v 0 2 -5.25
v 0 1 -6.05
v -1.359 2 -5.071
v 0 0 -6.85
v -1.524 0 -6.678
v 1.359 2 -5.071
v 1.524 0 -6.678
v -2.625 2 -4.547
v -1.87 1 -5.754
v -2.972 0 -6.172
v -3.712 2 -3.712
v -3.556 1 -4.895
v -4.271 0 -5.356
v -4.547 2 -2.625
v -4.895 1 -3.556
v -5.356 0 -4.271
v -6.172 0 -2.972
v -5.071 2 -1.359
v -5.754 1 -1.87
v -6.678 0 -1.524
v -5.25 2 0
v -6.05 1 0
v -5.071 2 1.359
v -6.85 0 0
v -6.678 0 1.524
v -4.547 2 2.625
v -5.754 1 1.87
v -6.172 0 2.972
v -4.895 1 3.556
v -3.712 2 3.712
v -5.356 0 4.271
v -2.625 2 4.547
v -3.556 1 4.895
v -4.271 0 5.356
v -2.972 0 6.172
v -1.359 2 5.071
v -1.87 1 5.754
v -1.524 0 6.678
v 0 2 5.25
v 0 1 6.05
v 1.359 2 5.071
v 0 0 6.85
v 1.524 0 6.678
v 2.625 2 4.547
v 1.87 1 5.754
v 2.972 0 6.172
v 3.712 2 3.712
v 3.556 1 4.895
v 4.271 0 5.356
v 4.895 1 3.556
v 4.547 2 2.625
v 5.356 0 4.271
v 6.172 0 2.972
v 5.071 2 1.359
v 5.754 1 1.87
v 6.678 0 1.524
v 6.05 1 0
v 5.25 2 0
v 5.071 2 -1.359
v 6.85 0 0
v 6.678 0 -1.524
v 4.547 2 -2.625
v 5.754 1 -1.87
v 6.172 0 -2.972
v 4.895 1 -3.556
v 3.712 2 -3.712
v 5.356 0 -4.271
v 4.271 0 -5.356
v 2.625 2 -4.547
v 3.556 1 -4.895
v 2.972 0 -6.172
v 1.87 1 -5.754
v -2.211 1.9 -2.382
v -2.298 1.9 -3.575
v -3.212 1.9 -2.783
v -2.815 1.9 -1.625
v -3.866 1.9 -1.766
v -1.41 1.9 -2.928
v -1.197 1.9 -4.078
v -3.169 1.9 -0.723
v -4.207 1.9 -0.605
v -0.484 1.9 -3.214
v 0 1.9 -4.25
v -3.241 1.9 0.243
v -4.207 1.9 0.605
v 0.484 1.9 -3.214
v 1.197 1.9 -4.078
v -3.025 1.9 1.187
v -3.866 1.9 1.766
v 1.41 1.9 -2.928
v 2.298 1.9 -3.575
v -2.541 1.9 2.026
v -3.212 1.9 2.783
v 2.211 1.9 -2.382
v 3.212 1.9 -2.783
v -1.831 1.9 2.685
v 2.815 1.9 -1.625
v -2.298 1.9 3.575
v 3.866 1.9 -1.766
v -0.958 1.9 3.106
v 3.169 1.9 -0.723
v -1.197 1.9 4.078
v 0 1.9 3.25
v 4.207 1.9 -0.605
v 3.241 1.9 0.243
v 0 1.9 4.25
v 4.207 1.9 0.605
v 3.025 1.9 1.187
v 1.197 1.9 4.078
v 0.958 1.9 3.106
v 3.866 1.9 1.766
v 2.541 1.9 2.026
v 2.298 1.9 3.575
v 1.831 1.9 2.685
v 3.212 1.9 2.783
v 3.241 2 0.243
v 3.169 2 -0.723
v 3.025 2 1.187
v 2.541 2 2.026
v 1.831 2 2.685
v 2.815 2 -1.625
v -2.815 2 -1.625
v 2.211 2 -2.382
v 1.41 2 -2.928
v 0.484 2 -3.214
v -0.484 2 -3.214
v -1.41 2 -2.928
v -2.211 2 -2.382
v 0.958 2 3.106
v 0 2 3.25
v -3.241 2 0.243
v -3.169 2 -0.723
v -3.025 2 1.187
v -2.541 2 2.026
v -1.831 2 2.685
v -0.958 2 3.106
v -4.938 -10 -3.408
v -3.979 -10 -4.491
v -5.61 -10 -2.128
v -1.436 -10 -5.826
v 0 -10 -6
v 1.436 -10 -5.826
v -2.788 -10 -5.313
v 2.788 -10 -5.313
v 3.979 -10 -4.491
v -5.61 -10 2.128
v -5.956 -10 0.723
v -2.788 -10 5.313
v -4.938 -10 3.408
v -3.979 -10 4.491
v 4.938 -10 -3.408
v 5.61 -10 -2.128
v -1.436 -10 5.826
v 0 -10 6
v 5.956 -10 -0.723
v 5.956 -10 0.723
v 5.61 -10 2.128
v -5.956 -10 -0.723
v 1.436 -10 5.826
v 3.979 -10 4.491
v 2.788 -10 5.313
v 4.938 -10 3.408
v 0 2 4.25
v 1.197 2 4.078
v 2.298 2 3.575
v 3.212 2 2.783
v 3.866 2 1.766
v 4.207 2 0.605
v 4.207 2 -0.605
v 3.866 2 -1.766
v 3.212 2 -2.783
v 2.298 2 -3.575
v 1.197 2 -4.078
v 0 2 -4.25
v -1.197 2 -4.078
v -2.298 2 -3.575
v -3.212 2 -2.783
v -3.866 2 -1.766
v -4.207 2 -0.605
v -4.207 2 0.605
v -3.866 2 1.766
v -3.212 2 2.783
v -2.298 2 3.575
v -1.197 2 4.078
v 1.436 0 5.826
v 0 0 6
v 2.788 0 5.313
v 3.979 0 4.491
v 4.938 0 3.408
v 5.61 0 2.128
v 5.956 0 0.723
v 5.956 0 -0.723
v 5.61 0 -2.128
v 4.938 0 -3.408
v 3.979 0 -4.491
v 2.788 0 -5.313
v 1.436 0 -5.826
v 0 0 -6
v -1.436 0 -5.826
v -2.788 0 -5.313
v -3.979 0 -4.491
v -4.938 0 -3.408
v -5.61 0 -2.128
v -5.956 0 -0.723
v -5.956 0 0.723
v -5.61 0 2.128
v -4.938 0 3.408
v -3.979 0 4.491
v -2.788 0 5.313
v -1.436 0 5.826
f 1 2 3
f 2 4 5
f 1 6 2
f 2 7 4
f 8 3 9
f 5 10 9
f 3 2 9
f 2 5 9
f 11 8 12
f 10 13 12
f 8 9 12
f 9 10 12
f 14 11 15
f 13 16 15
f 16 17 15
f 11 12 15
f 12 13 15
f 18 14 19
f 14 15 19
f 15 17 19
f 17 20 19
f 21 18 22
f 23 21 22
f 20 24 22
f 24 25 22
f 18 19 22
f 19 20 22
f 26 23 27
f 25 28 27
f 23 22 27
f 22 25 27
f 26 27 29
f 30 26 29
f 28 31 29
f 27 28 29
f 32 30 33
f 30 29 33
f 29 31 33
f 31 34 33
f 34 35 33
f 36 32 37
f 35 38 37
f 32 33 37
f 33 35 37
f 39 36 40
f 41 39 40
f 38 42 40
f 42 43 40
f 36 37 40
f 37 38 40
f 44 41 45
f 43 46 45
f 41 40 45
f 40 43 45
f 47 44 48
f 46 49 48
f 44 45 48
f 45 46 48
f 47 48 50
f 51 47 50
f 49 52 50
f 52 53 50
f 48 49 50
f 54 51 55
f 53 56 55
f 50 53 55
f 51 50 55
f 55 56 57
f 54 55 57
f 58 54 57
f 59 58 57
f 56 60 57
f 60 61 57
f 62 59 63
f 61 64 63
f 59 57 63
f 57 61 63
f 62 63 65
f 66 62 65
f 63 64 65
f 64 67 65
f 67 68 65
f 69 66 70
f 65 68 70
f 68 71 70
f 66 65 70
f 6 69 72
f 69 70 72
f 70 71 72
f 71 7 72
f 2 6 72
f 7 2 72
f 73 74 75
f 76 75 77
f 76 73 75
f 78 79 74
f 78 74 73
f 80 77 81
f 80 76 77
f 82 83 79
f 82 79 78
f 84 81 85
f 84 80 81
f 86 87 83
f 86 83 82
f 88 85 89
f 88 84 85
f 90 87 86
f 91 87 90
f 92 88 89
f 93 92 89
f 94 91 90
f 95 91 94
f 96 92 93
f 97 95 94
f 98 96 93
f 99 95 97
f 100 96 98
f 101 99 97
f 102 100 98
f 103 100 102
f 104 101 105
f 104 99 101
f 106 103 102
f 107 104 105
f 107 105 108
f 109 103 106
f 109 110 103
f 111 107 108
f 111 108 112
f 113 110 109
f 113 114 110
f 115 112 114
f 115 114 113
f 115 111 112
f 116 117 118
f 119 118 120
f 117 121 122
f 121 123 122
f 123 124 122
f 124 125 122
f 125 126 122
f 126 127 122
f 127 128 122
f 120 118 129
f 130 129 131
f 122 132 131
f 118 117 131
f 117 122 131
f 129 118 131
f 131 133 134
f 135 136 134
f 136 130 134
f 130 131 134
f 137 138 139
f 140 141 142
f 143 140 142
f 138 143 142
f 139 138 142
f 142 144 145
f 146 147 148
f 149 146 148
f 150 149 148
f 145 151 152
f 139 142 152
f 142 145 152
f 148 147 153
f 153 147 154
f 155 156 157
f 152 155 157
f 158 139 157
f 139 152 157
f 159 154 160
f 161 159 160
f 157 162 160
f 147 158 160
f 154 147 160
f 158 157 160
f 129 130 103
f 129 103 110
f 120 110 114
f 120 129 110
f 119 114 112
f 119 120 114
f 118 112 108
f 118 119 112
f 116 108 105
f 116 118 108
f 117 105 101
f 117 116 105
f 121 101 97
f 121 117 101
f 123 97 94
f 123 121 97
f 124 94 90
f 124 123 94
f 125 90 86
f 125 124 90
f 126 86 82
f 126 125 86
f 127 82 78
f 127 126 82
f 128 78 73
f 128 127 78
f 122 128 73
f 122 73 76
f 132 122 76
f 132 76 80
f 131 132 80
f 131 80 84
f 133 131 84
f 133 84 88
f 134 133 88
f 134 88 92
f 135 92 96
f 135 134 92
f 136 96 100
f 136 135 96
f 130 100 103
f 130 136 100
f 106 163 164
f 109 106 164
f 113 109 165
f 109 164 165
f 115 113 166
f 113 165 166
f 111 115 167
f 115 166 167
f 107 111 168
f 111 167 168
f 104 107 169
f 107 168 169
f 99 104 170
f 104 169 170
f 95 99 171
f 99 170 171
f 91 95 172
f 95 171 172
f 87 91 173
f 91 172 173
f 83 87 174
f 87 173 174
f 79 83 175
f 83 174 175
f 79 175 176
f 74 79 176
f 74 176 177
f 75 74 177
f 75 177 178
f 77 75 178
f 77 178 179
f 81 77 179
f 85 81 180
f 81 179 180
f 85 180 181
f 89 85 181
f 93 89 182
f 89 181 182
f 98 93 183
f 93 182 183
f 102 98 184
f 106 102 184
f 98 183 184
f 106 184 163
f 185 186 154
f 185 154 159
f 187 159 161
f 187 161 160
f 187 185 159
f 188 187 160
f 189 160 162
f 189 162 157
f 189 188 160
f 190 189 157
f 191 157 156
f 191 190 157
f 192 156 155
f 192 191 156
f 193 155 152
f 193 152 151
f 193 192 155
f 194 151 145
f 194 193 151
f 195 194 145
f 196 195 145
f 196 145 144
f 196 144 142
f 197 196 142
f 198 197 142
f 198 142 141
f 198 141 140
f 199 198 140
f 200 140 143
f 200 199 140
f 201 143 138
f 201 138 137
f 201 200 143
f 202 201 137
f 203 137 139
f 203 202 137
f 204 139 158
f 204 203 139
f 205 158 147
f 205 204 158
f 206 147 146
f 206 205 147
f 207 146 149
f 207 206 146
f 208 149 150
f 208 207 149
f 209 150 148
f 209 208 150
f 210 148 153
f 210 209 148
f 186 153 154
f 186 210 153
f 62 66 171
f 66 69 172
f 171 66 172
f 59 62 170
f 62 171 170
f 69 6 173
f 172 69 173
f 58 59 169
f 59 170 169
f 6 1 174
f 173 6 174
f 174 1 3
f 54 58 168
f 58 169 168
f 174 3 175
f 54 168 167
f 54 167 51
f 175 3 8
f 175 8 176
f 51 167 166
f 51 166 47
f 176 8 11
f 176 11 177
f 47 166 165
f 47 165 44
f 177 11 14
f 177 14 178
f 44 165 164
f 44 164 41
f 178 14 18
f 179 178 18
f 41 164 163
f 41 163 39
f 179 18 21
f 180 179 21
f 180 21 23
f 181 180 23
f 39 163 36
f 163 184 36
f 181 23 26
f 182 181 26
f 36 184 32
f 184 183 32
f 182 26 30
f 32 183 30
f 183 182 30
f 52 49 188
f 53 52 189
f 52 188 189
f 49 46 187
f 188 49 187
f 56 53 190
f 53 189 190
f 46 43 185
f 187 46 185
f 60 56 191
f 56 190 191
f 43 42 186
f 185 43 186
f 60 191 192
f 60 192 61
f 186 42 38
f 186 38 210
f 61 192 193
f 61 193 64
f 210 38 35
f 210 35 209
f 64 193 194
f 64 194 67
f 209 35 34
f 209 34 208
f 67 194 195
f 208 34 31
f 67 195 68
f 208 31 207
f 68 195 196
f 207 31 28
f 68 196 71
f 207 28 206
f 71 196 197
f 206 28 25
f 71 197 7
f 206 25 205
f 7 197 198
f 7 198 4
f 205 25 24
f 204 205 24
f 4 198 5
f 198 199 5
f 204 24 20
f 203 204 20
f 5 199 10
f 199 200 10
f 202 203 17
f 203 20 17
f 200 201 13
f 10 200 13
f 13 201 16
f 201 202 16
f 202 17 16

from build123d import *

# Parameters (mm, degrees)
ESQUISSE1_R             = 6
BOSS_EXTRU_1_DEPTH      = 10
ESQUISSE4_R             = 4.25
ESQUISSE4_R_2           = 3.25
ENL_V_MAT_EXTRU_1_DEPTH = 0.1


with BuildPart() as part:
    # Esquisse1 → Boss.-Extru.1 (new body)
    with BuildSketch(Plane(origin=(0, 0, 0), x_dir=(1, 0, 0), z_dir=(0, 1, 0))):
        with Locations(Location((0, 0, 0), (0, 0, 270))):
            Circle(ESQUISSE1_R)
    extrude(amount=-BOSS_EXTRU_1_DEPTH)

    # Esquisse3 → Révolution1 (revolve)
    with BuildSketch(Plane(origin=(0, 0, 0), x_dir=(0, 0, -1), z_dir=(1, 0, 0))):
        Polygon((0, 0), (0, 2), (5.25, 2), (6.85, 0), align=None)
    revolve(axis=Axis((0, 0, 0), (0, 1, 0)))

    # Esquisse4 → Enlèv. mat.-Extru.1 (cut)
    with BuildSketch(Plane(origin=(0, 2, 0), x_dir=(1, 0, 0), z_dir=(0, 1, 0))):
        with Locations(Location((0, 0, 0), (0, 0, 270))):
            Circle(ESQUISSE4_R)
        with Locations(Location((0, 0, 0), (0, 0, 270))):
            Circle(ESQUISSE4_R_2, mode=Mode.SUBTRACT)
    extrude(amount=-ENL_V_MAT_EXTRU_1_DEPTH, mode=Mode.SUBTRACT)


solid = part.part
